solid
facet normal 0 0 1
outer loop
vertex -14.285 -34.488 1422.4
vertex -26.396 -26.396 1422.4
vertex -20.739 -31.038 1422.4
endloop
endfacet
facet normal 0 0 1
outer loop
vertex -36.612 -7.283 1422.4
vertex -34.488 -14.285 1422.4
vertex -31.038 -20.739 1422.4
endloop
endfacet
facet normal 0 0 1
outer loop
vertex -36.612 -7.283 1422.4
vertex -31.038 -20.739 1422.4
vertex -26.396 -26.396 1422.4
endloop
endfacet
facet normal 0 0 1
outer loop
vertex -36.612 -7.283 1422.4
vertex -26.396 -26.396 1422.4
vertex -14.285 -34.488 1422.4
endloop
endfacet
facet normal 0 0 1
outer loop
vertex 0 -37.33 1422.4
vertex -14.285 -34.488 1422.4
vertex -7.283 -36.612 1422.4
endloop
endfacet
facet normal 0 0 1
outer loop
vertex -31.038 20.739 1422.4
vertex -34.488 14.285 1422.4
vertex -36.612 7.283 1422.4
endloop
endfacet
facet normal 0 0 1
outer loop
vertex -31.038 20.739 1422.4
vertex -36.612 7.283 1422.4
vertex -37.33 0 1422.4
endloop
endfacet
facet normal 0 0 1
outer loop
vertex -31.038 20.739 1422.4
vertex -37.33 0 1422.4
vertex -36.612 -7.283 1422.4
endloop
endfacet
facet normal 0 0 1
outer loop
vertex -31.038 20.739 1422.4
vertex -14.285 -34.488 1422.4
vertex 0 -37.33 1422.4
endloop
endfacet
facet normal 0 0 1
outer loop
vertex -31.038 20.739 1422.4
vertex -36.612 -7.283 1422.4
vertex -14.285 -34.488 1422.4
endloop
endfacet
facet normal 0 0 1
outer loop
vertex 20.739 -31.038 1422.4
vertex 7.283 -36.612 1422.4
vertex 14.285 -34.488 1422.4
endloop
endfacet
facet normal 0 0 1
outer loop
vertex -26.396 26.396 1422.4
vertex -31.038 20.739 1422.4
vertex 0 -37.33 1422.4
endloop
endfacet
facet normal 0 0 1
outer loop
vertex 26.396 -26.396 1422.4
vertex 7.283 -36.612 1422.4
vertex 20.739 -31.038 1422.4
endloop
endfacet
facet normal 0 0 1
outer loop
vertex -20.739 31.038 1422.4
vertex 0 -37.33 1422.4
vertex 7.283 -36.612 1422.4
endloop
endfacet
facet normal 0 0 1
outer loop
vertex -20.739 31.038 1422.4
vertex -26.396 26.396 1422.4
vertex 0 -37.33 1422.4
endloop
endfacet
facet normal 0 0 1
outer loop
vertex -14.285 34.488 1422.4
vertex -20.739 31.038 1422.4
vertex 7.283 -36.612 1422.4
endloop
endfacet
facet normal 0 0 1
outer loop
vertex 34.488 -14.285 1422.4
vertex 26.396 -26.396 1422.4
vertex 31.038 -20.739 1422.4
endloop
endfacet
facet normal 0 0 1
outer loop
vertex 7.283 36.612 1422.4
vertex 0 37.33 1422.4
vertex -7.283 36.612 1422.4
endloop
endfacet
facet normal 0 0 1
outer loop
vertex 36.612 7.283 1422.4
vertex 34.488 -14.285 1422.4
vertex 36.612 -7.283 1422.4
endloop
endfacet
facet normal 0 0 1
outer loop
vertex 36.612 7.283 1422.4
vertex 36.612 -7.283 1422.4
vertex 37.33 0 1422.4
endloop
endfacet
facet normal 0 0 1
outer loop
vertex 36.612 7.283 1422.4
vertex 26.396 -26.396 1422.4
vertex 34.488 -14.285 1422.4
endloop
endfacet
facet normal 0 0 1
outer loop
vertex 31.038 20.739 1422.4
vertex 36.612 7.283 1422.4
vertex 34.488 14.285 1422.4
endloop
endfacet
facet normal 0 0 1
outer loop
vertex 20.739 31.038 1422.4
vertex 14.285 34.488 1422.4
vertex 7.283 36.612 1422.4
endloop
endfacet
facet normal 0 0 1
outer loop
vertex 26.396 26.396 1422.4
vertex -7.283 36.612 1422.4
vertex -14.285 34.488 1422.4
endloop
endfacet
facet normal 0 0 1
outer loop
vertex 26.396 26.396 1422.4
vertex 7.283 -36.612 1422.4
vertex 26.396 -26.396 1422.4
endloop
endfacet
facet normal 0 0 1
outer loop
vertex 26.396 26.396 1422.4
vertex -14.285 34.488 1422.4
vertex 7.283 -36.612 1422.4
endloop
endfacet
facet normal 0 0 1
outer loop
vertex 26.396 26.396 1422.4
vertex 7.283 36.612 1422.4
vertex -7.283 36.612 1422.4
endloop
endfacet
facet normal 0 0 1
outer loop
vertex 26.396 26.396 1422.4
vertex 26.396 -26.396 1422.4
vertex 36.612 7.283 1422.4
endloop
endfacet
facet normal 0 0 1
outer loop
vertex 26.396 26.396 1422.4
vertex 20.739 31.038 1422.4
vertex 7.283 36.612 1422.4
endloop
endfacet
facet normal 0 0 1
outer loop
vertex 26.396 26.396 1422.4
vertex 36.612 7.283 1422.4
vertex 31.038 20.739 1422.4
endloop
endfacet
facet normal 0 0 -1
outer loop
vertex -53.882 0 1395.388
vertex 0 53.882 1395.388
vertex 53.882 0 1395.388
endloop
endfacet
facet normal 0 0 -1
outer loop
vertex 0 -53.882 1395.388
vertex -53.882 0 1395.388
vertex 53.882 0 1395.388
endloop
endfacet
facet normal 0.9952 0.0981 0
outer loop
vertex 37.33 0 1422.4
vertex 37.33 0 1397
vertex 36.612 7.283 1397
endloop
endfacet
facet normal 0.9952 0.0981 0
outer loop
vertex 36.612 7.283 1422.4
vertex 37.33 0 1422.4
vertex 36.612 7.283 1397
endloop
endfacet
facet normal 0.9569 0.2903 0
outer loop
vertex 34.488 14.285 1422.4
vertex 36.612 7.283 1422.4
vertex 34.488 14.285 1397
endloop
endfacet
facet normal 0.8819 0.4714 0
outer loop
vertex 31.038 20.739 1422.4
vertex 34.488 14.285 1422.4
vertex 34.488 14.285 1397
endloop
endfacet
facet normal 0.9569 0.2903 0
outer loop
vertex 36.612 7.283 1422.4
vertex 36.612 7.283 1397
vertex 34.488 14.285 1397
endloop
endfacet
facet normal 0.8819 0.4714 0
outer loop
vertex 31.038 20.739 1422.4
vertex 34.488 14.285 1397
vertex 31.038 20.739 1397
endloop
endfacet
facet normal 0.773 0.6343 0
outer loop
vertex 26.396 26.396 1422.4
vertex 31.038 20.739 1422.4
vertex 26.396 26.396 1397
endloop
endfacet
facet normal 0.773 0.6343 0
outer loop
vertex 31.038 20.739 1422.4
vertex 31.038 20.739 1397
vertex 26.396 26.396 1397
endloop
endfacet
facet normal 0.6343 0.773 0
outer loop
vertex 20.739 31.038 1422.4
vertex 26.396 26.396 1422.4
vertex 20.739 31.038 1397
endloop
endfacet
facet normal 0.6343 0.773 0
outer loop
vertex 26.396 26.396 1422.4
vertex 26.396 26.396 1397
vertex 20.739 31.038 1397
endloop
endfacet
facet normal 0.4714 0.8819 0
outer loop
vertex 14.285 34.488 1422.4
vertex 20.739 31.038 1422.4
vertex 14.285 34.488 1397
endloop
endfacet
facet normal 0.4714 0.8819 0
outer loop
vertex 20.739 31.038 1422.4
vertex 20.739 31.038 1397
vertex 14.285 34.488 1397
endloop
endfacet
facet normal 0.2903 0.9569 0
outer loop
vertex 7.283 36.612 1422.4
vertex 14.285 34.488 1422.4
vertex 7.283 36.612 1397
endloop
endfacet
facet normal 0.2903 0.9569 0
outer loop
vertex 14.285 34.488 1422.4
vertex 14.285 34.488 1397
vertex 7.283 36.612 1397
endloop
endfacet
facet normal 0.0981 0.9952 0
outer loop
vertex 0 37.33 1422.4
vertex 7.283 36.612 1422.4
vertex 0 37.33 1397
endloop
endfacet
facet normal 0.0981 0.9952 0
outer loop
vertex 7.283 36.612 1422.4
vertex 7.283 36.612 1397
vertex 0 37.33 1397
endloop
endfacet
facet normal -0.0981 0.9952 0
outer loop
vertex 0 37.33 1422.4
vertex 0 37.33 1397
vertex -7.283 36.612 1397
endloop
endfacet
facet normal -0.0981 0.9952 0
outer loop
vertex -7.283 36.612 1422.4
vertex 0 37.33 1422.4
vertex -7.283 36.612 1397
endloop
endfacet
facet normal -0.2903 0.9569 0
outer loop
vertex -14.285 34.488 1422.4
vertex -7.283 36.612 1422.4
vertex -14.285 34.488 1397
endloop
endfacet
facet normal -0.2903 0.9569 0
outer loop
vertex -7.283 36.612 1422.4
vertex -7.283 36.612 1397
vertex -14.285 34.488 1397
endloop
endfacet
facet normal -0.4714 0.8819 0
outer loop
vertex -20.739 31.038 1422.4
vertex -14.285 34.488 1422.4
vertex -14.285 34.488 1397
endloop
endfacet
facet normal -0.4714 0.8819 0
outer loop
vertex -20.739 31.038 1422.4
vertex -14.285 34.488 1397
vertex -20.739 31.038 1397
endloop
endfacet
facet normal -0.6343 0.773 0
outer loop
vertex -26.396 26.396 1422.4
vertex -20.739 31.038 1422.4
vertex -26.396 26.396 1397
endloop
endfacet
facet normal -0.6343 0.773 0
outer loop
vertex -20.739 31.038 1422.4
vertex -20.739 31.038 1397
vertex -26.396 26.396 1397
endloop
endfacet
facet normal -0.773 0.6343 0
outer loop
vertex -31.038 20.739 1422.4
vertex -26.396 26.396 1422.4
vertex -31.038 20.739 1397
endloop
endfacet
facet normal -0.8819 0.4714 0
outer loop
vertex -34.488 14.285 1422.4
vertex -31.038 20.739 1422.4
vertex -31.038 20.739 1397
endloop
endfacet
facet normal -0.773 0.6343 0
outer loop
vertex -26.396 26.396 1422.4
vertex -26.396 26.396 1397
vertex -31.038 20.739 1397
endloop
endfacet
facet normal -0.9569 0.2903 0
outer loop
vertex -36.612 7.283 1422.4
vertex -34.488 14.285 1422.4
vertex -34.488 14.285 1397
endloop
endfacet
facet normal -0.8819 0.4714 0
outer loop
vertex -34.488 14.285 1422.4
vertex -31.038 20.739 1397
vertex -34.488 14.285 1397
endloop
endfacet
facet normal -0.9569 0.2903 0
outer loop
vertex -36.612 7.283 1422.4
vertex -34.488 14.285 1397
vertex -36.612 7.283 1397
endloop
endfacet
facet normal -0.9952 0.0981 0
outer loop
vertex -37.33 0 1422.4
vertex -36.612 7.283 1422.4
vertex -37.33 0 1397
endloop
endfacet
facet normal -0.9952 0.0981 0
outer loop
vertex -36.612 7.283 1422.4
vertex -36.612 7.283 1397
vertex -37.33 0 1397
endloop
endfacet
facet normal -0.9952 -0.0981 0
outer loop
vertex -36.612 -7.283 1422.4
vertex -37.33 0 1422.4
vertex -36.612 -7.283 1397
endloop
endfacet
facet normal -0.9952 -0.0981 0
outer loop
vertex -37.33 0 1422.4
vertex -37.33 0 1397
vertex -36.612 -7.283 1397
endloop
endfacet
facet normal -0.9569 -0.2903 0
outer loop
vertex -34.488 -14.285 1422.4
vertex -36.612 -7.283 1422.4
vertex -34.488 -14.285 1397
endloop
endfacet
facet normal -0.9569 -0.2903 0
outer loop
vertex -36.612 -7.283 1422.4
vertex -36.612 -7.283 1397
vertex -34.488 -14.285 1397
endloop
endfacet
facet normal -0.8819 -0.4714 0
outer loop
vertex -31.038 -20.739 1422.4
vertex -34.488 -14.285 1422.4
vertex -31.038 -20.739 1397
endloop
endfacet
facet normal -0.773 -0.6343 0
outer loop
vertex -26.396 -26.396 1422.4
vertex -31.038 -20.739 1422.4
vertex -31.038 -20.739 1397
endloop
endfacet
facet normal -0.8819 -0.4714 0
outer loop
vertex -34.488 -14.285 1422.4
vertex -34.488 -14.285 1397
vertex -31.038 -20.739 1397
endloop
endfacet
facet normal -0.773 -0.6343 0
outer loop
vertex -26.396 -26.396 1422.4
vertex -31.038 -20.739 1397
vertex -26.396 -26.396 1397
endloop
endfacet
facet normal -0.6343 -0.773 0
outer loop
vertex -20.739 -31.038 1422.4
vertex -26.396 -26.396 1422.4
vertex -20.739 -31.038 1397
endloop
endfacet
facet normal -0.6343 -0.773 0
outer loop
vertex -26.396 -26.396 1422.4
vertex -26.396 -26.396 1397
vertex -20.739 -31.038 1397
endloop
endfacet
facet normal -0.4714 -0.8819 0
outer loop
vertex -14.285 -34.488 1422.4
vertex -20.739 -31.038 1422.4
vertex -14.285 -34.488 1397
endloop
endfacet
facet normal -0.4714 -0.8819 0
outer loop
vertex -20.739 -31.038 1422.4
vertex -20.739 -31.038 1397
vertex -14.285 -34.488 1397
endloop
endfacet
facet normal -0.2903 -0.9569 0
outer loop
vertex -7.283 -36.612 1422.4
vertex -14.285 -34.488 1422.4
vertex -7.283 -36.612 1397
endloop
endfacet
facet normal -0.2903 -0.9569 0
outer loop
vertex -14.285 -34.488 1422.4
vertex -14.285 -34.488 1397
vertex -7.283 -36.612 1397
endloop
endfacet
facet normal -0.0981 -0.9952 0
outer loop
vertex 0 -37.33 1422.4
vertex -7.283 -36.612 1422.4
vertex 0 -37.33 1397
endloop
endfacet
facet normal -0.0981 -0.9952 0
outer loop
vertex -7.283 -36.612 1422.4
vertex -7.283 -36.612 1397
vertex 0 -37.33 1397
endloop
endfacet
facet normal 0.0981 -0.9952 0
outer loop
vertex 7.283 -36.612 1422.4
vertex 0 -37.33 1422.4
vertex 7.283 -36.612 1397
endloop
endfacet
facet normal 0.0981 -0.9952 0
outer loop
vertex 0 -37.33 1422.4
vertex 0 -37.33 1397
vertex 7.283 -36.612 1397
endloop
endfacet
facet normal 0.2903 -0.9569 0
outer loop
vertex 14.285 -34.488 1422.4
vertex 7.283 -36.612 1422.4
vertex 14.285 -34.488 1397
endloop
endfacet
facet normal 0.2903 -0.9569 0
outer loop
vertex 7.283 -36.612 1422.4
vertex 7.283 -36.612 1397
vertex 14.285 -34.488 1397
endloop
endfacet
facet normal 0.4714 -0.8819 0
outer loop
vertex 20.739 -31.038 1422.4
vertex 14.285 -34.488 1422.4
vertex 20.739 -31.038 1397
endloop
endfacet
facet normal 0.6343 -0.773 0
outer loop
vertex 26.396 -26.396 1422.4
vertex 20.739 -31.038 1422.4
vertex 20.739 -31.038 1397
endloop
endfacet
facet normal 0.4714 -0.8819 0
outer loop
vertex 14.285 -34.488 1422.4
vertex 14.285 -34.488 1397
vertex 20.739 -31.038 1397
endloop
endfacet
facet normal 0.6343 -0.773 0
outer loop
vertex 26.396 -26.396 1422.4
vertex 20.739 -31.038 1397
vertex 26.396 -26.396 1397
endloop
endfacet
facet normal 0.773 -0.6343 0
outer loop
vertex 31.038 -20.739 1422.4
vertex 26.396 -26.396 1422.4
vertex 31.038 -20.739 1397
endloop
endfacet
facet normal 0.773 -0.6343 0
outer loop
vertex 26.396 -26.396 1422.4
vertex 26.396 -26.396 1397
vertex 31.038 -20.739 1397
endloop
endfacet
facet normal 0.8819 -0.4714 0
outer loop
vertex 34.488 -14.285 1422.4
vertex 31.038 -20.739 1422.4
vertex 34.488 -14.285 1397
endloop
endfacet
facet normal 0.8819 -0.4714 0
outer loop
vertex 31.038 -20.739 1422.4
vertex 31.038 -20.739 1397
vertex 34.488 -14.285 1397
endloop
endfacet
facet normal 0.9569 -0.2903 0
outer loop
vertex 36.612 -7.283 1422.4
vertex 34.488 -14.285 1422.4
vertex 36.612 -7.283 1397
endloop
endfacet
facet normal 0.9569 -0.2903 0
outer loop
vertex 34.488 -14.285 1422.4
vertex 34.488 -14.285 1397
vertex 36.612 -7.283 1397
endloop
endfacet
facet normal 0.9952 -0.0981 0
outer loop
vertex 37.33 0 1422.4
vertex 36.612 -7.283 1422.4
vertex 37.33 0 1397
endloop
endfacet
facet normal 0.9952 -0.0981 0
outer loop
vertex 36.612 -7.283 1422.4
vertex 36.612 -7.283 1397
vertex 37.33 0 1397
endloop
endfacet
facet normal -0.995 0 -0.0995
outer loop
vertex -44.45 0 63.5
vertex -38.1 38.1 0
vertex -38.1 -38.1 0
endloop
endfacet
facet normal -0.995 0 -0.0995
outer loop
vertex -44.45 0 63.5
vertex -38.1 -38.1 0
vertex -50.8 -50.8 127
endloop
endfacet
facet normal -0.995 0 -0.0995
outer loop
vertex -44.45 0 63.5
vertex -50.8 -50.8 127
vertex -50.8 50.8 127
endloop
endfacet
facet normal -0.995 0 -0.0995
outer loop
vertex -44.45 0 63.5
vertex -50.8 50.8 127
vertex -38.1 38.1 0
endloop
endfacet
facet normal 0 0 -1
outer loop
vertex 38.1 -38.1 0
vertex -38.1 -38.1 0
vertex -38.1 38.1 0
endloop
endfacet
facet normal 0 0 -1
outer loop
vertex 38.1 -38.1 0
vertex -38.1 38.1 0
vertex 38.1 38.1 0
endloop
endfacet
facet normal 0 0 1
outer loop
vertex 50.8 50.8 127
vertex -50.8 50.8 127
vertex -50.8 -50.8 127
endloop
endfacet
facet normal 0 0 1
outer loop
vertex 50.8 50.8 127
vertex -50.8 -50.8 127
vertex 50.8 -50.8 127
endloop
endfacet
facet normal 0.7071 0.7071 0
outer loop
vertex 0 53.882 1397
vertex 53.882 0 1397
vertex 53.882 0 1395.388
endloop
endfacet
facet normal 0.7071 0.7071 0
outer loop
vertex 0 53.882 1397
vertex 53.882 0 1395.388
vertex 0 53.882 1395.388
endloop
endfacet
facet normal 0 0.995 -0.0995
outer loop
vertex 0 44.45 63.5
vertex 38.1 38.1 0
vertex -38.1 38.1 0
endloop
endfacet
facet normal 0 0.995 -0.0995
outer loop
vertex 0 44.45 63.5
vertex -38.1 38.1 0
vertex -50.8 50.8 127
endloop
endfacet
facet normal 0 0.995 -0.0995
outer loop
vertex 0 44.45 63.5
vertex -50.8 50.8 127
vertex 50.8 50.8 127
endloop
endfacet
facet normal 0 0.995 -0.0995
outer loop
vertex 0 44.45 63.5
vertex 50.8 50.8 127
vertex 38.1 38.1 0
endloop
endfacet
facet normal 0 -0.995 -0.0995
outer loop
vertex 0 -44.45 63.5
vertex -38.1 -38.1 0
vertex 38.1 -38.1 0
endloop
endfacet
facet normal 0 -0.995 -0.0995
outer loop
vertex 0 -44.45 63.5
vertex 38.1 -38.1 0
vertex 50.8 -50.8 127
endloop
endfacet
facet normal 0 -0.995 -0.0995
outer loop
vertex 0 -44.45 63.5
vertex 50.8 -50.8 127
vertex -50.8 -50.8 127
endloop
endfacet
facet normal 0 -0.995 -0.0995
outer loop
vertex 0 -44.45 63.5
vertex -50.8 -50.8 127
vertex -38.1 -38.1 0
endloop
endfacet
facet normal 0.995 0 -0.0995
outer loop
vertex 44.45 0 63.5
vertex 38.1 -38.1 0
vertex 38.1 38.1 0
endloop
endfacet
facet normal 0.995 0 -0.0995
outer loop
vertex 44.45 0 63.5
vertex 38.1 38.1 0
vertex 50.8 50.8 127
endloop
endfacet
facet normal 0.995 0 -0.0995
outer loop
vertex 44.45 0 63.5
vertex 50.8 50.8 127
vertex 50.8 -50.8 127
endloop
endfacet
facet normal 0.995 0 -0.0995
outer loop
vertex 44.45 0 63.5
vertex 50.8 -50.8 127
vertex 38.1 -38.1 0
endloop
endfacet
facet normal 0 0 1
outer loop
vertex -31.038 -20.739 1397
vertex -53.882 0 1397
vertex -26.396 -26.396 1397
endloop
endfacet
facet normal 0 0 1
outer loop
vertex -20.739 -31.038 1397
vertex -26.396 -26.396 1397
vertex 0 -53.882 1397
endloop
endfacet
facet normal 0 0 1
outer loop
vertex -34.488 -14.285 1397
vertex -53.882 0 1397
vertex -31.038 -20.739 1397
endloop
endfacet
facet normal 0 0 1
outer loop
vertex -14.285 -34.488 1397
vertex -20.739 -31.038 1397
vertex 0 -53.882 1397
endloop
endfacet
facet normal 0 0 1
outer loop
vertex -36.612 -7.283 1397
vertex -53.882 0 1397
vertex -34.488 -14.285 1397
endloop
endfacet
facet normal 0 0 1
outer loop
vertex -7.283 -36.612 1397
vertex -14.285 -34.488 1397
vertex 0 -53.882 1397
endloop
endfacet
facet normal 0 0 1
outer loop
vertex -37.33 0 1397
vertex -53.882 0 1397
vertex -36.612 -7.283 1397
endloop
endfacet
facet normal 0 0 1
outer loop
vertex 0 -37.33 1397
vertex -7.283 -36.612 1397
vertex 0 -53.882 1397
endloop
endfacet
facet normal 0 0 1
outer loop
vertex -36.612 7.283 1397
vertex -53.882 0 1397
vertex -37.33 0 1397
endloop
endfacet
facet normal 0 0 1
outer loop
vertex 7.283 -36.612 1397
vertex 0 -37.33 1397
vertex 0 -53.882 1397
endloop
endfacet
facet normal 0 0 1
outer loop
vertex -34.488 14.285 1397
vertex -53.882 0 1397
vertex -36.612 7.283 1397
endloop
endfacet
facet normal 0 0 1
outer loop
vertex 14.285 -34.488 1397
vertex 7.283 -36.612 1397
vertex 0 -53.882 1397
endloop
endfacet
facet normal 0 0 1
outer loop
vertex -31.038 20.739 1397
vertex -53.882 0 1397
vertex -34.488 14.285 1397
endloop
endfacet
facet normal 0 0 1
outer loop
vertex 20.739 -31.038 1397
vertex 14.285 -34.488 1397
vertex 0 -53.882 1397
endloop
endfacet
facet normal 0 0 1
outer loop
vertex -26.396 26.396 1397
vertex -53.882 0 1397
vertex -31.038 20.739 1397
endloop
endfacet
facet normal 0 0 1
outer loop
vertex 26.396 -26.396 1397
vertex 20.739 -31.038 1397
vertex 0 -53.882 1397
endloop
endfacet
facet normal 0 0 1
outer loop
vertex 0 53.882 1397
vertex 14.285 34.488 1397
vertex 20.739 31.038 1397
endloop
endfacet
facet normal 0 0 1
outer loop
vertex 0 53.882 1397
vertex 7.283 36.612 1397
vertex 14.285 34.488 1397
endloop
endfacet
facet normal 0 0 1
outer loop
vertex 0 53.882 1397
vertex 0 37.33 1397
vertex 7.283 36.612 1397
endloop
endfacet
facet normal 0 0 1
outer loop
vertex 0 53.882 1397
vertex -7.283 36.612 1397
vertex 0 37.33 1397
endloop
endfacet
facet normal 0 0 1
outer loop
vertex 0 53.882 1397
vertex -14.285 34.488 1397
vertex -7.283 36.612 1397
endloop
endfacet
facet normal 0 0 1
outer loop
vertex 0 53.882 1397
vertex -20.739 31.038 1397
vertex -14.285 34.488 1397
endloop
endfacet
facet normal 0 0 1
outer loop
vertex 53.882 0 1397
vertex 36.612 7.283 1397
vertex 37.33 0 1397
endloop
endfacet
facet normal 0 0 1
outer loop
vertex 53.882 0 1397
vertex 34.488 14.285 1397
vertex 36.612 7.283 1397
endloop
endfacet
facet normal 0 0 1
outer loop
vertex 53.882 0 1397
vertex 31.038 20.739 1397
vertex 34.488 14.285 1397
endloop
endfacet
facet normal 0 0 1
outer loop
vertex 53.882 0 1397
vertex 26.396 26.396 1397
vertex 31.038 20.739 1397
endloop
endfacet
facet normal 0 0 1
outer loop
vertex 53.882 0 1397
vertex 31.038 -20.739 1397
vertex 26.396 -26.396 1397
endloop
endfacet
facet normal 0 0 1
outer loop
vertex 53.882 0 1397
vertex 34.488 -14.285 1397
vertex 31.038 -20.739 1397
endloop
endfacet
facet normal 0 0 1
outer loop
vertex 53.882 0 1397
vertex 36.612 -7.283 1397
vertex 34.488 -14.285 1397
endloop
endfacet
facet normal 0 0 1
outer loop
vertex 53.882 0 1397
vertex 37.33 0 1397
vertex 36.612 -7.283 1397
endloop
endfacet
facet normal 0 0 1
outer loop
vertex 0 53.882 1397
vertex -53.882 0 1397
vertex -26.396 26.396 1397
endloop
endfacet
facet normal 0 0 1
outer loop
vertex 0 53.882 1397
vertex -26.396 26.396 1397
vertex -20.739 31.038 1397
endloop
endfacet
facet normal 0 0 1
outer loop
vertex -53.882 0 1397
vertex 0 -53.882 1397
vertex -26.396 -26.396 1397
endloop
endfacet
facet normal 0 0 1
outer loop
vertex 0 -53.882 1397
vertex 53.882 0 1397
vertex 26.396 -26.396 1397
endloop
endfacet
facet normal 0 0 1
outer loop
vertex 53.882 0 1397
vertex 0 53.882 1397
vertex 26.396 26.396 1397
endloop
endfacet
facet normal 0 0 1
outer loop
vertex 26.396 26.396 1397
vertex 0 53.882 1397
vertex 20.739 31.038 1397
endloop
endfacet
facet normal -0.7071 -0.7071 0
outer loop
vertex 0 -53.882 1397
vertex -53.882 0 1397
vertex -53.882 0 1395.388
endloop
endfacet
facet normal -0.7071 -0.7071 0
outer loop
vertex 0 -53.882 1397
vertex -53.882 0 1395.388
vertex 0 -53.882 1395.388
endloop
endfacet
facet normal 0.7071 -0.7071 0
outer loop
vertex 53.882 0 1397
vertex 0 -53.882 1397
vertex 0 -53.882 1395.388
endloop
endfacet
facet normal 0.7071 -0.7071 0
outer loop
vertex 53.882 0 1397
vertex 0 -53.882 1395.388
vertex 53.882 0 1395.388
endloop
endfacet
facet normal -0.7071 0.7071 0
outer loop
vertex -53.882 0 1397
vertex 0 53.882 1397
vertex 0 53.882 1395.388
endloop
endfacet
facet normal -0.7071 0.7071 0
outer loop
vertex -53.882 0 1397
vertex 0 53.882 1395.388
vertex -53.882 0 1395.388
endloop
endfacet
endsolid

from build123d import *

# Parameters (mm, degrees)
F2_W      = 76.2
F2_H      = 76.2
F3_W      = 101.6
F3_H      = 101.6
F15_DEPTH = 1.6122553498
F5_R      = 37.3295934584
F16_DEPTH = 25.4


# Not quite as in the source:
# - the program builds the solid bodies; features that only make, move or delete a surface that nothing else refers to are left out


with BuildPart() as f14:
    # F2 (on Top) → F14 section 0
    with BuildSketch(Plane.XY):
        Rectangle(F2_W, F2_H)
    # F3 (on offset) → F14 section 1
    with BuildSketch(Plane.XY.offset(127)):
        Rectangle(F3_W, F3_H)
    loft()


with BuildPart() as f15:
    # F4 (on offset) → F15 (new body)
    with BuildSketch(Plane.XY.offset(1397)):
        Polygon((0, 53.8815367264), (-53.8815367264, 0), (0, -53.8815367264), (53.8815367264, 0), align=None)
    extrude(amount=-F15_DEPTH)

    # F5 (on offset) → F16 (join)
    with BuildSketch(Plane.XY.offset(1397)):
        Circle(F5_R)
    extrude(amount=F16_DEPTH)


solid = Compound([f14.part, f15.part])
